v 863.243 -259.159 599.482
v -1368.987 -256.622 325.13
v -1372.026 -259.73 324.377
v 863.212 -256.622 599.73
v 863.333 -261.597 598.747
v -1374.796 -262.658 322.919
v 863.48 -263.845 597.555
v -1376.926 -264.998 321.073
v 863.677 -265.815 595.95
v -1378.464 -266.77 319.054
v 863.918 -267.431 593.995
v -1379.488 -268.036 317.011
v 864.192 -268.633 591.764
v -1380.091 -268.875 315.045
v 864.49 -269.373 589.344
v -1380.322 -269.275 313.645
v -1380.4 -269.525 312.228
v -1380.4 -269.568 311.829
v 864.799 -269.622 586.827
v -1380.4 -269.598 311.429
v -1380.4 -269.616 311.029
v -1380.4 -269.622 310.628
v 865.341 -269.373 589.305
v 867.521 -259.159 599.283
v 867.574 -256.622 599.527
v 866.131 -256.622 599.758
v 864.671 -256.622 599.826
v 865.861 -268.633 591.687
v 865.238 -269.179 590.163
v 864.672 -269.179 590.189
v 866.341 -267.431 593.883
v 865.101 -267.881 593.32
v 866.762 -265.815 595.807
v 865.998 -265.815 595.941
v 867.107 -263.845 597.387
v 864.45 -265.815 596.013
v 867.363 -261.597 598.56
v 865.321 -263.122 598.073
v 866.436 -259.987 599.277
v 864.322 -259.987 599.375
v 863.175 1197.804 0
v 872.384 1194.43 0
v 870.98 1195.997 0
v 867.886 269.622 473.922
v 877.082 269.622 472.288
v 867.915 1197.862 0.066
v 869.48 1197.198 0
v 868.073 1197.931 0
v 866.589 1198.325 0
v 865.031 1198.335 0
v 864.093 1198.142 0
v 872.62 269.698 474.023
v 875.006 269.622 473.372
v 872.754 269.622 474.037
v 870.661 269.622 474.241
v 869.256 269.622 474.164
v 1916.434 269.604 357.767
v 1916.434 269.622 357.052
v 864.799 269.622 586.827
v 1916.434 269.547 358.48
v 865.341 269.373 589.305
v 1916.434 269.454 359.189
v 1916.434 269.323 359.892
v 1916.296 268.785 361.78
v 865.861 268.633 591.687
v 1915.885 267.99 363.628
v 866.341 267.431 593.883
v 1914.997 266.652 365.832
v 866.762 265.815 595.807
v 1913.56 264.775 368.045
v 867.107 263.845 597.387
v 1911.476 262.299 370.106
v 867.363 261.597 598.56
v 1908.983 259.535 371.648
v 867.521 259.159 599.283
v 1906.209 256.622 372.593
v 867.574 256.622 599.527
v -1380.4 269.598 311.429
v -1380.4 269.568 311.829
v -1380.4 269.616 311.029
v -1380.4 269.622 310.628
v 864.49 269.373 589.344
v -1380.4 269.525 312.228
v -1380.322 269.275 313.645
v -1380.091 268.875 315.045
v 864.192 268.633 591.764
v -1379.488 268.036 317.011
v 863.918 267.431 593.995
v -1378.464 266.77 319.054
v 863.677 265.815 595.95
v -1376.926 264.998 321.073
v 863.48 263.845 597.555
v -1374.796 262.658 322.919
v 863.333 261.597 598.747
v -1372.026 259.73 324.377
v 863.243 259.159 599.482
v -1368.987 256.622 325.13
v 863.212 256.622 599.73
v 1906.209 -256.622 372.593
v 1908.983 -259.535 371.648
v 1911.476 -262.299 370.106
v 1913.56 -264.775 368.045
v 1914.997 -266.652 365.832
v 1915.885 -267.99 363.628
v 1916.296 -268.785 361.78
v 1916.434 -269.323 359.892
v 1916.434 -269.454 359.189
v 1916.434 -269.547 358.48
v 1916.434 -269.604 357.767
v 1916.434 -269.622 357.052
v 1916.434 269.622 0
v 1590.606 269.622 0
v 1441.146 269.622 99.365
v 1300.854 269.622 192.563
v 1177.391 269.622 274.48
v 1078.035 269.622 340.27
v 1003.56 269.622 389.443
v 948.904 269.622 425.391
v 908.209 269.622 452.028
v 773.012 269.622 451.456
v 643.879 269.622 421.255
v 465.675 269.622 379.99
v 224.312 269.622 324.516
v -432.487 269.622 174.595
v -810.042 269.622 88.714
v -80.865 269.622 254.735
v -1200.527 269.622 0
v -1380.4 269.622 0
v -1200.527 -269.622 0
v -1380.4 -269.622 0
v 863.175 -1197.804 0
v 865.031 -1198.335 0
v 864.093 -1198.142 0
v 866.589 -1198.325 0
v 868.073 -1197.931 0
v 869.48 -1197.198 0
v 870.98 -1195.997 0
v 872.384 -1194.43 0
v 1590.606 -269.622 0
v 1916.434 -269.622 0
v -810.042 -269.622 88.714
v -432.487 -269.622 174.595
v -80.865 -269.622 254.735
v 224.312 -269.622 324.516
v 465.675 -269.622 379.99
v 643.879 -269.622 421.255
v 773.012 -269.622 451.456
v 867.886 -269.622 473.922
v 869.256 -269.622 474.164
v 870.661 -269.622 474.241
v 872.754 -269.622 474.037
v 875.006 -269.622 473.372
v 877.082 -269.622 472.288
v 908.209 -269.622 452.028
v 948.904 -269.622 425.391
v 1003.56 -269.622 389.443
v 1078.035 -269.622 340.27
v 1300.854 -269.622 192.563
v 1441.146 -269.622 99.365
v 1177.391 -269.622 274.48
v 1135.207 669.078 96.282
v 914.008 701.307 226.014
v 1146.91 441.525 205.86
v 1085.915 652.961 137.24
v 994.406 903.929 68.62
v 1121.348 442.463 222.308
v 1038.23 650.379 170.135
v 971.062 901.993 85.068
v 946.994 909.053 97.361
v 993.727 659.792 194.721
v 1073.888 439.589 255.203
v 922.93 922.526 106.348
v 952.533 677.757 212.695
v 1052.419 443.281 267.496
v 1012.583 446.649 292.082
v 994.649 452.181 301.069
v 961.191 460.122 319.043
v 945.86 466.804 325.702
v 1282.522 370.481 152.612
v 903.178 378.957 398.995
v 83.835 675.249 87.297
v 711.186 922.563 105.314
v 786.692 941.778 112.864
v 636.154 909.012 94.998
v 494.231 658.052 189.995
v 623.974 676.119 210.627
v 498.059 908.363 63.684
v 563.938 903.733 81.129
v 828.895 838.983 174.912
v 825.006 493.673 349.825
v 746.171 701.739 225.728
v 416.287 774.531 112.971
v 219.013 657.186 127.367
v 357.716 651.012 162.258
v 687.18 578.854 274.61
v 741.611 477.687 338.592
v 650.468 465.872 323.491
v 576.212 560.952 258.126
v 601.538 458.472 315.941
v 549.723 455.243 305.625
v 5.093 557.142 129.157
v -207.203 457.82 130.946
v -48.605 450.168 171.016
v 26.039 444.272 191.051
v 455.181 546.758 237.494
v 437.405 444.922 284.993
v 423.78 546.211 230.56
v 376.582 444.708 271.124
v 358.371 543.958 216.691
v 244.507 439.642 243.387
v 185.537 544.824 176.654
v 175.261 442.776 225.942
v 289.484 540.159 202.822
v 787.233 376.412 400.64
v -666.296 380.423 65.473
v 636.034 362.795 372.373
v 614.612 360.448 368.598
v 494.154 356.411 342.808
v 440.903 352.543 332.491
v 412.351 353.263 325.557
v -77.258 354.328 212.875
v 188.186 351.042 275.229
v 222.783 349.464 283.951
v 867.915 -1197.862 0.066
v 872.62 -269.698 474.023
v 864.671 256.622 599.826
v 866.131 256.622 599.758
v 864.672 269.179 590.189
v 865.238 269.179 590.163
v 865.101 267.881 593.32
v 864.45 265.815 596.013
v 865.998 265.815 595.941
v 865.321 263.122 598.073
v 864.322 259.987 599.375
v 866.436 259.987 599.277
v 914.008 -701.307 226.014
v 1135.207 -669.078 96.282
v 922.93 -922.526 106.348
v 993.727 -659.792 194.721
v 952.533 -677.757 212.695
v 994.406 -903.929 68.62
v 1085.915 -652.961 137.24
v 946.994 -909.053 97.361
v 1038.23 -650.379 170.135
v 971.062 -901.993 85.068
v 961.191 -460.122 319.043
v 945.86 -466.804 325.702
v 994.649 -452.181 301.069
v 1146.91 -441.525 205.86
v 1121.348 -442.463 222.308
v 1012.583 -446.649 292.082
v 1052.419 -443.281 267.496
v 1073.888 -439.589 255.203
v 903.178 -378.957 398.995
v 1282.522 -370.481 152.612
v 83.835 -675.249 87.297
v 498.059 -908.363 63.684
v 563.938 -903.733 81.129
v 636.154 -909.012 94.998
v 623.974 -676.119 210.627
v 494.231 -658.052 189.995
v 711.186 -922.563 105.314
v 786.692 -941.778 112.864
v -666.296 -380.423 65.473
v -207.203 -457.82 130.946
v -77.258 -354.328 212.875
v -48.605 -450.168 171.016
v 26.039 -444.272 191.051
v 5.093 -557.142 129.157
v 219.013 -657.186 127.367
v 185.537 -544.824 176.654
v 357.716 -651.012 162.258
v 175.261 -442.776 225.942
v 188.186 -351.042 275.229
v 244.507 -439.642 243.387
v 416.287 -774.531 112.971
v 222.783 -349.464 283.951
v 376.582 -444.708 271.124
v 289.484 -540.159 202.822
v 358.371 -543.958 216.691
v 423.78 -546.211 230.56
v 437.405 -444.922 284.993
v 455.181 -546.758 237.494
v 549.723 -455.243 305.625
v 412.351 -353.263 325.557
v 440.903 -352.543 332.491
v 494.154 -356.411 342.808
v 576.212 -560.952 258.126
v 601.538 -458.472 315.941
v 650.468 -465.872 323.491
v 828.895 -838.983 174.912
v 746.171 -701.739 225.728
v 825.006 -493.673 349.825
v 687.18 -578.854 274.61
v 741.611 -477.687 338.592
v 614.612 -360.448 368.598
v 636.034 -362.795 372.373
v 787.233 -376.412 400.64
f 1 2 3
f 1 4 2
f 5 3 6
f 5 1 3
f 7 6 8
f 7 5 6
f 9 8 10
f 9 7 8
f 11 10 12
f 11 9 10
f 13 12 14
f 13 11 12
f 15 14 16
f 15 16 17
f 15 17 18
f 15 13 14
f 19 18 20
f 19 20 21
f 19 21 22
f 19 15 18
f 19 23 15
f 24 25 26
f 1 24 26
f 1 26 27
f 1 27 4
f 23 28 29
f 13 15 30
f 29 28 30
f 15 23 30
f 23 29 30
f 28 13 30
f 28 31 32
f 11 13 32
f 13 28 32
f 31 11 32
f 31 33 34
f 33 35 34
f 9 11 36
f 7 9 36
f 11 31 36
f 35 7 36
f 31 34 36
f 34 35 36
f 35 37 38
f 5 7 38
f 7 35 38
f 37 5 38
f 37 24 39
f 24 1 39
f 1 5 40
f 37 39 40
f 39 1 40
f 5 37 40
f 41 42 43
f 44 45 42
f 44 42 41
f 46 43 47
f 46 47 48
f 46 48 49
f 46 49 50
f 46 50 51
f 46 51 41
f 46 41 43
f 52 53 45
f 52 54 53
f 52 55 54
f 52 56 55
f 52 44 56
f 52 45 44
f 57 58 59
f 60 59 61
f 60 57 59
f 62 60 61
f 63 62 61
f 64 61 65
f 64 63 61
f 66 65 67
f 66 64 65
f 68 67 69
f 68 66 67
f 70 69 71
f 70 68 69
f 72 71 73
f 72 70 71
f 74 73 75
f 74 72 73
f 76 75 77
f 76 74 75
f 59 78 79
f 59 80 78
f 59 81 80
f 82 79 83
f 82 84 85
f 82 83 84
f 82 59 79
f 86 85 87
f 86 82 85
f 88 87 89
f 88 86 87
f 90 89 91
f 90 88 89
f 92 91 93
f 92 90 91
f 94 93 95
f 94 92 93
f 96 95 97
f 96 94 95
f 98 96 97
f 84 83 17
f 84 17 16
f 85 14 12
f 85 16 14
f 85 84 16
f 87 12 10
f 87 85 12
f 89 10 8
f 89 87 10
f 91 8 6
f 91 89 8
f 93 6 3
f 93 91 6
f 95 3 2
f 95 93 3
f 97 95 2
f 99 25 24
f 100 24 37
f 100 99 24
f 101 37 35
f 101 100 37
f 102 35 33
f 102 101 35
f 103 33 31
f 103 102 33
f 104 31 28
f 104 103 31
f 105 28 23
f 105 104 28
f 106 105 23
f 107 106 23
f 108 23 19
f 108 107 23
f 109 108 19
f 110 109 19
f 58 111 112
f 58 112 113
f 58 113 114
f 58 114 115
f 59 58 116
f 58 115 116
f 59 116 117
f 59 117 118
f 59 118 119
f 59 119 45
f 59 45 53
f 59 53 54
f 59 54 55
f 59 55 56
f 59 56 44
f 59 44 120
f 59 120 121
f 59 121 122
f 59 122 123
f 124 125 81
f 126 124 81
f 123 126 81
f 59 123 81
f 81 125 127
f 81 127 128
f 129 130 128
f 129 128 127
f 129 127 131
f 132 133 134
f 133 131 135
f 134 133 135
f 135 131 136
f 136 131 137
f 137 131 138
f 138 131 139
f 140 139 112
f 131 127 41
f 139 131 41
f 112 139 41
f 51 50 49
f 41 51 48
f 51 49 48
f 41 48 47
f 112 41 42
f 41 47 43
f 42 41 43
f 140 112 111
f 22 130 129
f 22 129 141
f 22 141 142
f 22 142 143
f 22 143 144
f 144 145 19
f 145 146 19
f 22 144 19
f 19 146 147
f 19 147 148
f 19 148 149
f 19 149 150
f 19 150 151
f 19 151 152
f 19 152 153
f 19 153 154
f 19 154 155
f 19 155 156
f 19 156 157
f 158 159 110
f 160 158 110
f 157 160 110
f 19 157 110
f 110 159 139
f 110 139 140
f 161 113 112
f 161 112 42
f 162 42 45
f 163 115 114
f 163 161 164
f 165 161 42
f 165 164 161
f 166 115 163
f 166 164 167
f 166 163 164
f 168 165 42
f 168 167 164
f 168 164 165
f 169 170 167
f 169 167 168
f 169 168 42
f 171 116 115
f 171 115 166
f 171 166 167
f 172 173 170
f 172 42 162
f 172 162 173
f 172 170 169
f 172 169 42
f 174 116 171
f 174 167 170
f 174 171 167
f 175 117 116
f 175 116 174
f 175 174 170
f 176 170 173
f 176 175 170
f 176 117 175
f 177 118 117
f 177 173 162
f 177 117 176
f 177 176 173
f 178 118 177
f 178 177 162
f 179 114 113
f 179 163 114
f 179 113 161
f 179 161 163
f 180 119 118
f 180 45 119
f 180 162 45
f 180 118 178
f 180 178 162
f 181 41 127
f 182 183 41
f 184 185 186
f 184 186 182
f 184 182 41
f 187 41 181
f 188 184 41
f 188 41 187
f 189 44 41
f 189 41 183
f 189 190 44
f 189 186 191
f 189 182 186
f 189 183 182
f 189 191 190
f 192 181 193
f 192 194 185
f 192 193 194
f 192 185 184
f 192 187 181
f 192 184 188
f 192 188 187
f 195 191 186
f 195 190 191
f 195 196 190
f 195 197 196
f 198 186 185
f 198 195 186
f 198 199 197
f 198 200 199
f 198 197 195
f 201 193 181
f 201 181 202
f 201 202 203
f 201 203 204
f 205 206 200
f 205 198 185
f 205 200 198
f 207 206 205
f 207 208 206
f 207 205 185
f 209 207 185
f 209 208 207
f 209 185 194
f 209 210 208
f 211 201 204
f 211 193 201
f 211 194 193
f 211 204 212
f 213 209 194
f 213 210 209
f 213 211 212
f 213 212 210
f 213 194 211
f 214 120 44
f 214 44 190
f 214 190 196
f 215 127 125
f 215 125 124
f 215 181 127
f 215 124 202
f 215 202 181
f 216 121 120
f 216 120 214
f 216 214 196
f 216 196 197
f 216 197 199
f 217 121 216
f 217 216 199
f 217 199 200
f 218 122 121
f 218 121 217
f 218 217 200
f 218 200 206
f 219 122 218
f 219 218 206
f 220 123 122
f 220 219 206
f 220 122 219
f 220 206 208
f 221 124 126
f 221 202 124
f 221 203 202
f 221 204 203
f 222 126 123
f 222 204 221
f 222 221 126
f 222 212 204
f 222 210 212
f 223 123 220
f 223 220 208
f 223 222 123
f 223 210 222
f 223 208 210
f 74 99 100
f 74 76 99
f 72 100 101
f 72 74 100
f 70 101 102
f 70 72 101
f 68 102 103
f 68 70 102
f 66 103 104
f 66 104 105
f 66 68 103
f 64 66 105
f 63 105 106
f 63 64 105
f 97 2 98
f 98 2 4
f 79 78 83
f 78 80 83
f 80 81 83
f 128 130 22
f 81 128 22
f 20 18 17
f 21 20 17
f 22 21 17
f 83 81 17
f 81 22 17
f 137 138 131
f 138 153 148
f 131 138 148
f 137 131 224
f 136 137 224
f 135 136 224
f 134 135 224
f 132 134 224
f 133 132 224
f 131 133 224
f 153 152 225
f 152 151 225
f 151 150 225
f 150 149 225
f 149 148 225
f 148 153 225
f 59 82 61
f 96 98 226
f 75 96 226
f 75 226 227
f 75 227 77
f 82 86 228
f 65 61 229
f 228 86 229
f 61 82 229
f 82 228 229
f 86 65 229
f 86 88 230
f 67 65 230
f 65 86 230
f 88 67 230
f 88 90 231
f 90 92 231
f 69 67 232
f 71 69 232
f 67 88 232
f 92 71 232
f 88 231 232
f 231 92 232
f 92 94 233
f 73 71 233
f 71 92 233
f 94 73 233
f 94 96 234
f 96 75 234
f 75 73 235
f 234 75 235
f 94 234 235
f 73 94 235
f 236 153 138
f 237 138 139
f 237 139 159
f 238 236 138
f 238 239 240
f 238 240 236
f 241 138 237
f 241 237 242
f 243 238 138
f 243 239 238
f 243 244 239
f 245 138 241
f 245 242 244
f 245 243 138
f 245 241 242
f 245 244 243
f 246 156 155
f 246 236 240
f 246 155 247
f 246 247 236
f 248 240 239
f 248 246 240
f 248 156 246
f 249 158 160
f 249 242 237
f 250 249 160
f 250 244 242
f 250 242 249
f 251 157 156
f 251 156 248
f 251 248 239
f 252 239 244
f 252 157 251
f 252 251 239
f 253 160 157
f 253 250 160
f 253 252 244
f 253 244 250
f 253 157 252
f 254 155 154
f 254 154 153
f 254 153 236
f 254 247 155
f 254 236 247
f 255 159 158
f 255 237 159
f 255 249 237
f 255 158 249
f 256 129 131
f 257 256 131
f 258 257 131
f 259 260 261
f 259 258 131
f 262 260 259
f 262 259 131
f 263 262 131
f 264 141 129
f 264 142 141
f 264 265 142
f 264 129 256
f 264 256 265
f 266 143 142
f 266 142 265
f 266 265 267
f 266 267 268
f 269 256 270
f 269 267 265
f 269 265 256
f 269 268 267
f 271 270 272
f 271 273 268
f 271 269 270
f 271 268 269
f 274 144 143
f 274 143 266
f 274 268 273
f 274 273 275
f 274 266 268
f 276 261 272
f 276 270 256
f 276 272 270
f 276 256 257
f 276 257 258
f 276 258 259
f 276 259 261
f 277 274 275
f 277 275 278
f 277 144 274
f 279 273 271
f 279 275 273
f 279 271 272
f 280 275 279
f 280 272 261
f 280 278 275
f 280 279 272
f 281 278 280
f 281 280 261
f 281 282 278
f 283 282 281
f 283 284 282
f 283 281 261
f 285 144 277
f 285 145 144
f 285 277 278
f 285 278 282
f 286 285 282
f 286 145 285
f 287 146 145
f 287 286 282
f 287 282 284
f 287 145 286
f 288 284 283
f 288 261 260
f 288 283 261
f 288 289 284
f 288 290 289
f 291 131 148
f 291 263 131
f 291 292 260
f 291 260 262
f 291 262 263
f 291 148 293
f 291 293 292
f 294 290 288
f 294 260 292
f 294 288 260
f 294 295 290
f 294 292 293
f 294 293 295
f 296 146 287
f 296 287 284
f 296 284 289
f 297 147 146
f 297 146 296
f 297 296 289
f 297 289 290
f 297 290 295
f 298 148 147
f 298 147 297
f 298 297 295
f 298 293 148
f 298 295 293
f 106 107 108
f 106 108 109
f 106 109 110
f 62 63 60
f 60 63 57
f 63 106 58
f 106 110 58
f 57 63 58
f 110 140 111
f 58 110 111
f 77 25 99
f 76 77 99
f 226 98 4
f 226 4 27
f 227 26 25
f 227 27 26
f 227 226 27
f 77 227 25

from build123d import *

# Parameters (mm, degrees)
F5_DEPTH = 600
F7_DEPTH = 1469.6233856019
F8_R     = 13


with BuildPart() as f3:
    # F0 (on Top) → F3 section 0
    with BuildSketch(Plane.XY):
        Polygon((1800, 0), (868.0580854416, 1200), (-1800, 0), (868.0580854416, -1200), align=None)
    # F2 (on offset) → F3 section 1
    with BuildSketch(Plane.XY.offset(600)):
        Polygon((899.0031123161, 0), (874.0031123161, 25), (849.0031123161, 0), (874.0031123161, -25), align=None)
    loft()

    # F4 (on face) → F5 (join)
    with BuildSketch(Plane.XY):
        Polygon((-1200.5265119548, -269.6223855019), (1590.6063315397, -269.6223855019), (1800, 0), (1590.6063315397, 269.6223855019), (-1200.5265119548, 269.6223855019), (-1800, 0), align=None)
        Polygon((-1916.4335727692, -269.6223855019), (-1200.5265119548, -269.6223855019), (-1800, 0), (-1200.5265119548, 269.6223855019), (-1916.4335727692, 269.6223855019), align=None)
        Polygon((1590.6063315397, -269.6223855019), (1916.4335727692, -269.6223855019), (1916.4335727692, 269.6223855019), (1590.6063315397, 269.6223855019), (1800, 0), align=None)
    extrude(amount=F5_DEPTH)

    # F6 (on face) → F7 (cut, through all)
    with BuildSketch(Plane.XZ.offset(269.6223855019)):
        Polygon((-1380.3998167432, 323.7263331278), (865.4105067253, 600), (-1916.4335727692, 600), (-1916.4335727692, 0), (-1380.3998167432, 0), align=None)
        Polygon((1916.4335727692, 600), (865.4105067253, 600), (1916.4335727692, 370.3585863113), align=None)
    extrude(amount=-F7_DEPTH, mode=Mode.SUBTRACT)

    # F8
    f8_edges = [f3.edges().sort_by_distance(p)[0] for p in [
        (1390.92204, -269.622386, 485.179293),
        (1916.433573, 0, 370.358586),
        (-257.494655, -269.622386, 461.863167),
        (865.410507, 0, 600),
        (-257.494655, 269.622386, 461.863167),
        (-1380.399817, 0, 323.726333),
        (1390.92204, 269.622386, 485.179293),
        (870.411753, -734.811193, 237.543221),
        (870.411753, 734.811193, 237.543221),
    ]]
    fillet(f8_edges, radius=F8_R)


solid = f3.part
